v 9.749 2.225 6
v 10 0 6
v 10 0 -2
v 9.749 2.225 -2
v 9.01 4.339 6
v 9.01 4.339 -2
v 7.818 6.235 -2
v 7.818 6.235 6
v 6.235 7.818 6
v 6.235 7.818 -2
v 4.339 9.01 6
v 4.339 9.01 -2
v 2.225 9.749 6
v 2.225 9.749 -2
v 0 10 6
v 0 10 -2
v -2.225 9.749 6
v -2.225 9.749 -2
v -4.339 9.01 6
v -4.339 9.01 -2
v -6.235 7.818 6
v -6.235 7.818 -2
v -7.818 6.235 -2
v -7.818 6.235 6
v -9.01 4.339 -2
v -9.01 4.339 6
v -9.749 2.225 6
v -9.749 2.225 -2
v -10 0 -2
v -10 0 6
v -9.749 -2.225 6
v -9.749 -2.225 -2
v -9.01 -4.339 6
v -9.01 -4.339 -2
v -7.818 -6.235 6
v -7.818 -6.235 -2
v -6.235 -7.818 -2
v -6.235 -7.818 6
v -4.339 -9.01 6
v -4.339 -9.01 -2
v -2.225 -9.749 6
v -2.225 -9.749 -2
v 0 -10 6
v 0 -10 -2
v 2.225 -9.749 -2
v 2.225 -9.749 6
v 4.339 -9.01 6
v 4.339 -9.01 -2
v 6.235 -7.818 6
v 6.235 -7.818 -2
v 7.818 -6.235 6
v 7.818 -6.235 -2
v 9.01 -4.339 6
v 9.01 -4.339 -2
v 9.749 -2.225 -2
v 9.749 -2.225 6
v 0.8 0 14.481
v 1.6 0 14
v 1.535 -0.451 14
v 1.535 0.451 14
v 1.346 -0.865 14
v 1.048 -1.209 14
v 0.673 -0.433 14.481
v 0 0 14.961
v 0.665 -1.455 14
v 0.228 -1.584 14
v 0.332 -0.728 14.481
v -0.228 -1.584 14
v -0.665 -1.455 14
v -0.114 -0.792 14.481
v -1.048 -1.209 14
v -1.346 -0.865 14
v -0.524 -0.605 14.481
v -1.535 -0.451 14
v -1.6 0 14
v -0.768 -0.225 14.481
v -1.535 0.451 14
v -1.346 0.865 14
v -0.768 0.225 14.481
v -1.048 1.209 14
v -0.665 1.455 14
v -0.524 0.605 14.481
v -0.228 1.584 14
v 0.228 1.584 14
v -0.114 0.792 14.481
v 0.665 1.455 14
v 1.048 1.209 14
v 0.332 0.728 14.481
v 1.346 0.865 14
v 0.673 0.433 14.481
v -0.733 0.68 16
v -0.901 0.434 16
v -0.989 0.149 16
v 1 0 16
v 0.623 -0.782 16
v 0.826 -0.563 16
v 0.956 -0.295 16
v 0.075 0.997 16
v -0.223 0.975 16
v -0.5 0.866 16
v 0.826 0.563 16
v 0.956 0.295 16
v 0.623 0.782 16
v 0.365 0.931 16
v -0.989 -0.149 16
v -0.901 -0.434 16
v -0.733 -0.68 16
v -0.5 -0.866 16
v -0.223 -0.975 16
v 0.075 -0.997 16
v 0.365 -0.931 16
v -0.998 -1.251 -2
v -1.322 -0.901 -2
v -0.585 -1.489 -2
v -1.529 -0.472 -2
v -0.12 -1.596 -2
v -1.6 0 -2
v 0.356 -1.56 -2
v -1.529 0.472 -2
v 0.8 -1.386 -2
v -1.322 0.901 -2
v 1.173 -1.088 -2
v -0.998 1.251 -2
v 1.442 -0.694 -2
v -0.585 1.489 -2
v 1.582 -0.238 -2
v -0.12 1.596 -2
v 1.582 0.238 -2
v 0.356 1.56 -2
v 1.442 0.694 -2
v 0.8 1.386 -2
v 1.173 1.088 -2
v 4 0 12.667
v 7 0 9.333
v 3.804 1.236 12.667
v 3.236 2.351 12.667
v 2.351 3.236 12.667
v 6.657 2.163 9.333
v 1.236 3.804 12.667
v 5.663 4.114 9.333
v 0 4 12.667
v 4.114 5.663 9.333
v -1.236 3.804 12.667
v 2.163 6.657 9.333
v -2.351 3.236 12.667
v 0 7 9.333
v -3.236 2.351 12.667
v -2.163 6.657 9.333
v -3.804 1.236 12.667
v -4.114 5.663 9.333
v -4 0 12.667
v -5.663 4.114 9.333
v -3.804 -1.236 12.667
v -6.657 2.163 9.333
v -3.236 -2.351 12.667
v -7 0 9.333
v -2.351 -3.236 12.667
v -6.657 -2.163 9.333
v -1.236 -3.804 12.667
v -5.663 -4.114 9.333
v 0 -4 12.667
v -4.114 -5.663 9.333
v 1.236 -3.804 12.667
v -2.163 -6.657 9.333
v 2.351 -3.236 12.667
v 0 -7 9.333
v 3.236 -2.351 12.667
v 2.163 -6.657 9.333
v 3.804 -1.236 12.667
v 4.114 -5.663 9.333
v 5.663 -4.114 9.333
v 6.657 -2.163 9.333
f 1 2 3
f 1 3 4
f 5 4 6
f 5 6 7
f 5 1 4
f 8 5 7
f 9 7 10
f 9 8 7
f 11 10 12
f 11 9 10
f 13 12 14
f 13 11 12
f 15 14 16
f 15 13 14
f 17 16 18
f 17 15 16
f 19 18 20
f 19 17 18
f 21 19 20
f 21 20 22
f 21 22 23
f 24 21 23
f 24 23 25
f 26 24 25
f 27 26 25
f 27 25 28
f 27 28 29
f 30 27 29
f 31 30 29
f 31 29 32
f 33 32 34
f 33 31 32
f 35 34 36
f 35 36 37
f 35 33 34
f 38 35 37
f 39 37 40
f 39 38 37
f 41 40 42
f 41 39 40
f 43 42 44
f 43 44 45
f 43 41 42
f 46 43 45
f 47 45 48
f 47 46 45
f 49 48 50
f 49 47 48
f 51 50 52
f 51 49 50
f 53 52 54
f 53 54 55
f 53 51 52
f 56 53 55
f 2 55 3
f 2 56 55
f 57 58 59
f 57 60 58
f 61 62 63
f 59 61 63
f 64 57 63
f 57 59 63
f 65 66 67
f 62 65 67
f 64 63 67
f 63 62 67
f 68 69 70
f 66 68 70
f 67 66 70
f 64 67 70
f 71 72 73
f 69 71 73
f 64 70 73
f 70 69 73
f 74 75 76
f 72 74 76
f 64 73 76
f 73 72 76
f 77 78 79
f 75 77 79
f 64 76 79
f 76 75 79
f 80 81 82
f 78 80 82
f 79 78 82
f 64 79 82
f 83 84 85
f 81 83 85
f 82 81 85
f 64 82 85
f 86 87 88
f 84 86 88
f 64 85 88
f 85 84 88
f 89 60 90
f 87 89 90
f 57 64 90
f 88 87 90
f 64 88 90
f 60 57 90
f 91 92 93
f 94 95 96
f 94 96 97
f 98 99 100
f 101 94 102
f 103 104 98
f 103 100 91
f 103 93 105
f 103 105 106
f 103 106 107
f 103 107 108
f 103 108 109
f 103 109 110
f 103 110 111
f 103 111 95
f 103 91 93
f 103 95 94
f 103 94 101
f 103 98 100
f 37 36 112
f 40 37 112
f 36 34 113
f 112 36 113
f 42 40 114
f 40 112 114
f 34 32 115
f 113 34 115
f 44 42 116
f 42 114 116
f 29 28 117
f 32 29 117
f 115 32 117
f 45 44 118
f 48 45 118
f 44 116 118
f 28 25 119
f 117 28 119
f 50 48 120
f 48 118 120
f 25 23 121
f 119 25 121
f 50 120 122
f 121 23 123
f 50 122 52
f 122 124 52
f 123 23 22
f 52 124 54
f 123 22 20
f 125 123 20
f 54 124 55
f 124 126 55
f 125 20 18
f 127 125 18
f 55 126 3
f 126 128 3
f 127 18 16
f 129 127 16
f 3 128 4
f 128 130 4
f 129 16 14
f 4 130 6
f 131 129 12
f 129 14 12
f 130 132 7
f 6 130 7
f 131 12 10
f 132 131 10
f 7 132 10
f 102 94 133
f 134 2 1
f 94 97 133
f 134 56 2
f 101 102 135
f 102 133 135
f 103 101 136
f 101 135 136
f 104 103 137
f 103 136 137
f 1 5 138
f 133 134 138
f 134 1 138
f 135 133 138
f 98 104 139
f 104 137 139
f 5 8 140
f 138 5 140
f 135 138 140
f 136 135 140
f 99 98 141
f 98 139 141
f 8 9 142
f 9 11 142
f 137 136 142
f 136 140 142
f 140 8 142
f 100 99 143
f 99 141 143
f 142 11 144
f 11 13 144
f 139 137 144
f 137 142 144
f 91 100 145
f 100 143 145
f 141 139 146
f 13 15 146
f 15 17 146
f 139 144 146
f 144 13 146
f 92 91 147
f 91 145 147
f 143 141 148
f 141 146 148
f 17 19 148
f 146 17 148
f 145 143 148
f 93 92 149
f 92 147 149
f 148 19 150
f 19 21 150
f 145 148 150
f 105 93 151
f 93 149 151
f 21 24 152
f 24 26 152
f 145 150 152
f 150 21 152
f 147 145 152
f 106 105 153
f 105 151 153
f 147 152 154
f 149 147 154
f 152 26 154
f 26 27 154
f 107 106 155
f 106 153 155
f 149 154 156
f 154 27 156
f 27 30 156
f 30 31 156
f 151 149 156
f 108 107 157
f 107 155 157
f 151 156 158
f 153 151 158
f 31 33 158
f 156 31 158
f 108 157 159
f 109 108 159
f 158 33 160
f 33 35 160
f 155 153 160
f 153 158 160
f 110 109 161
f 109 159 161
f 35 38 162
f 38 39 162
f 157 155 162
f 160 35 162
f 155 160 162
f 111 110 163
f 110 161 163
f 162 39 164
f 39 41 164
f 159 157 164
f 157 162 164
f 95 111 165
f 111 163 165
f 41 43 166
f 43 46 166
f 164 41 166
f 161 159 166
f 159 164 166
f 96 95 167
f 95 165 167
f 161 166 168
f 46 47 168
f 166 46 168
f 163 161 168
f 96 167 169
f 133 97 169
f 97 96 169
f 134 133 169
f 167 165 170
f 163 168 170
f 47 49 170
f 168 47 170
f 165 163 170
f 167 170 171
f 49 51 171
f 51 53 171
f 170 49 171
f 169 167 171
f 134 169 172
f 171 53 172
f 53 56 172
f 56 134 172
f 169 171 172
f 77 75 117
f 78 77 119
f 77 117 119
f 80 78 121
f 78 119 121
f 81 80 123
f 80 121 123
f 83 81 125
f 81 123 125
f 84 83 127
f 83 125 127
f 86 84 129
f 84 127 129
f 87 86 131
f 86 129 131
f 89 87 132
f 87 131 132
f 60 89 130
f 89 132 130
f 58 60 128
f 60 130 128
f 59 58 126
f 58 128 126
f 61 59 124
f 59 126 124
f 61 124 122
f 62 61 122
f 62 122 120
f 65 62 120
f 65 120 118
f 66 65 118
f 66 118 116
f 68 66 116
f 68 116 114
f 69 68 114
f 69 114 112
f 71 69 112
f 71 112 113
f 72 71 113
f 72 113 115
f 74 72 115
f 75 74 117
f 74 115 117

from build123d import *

# Parameters (mm, degrees)
F0_R           = 10
F0_R_2         = 6.1
F1_DEPTH       = 6
F2_DEPTH       = 10
F4_R           = 1
F1_FACE_R      = 10
F7_D           = 4.2
F7_CBORE_D     = 7
F7_CBORE_DEPTH = 4
F8_D           = 3.2
F8_DEPTH       = 8
F8_START       = 6
F8_TIP         = 0.9613769904
F6_R           = 10
F10_DEPTH      = 8
F12_DEPTH      = 10


with BuildPart() as f1:
    # F0 (on Top) → F1 (new body)
    with BuildSketch(Plane.XY):
        Circle(F0_R)
        Circle(F0_R_2, mode=Mode.SUBTRACT)
        Circle(F0_R_2)
    extrude(amount=F1_DEPTH)

    # F0 (on Top) → F2 (join)
    with BuildSketch(Plane.XY):
        Circle(F0_R)
        Circle(F0_R_2, mode=Mode.SUBTRACT)
    extrude(amount=-F2_DEPTH)

    # F7 (through all)
    with Locations(Plane(origin=(0, 0, 0), x_dir=(1, 0, 0), z_dir=(0, 0, -1))):
        with Locations((0, 0)):
            CounterBoreHole(F7_D / 2, F7_CBORE_D / 2, F7_CBORE_DEPTH)


with BuildPart() as f5:
    # F4 (on offset) → F5 section 0
    with BuildSketch(Plane.XY.offset(16)):
        Circle(F4_R)
    # F1_face (on face) → F5 section 1
    with BuildSketch(Plane.XY.offset(6)):
        Circle(F1_FACE_R)
    loft()

    # F8
    # its depths count from where the whole tool has entered the part; down to there all is cleared
    with Locations(Plane(origin=(0, 0, 0), x_dir=(1, 0, 0), z_dir=(0, 0, -1)).offset(-F8_START)):
        with Locations((0, 0)):
            Hole(F8_D / 2, depth=F8_DEPTH)
            with Locations((0, 0, -(F8_DEPTH + F8_TIP / 2))):  # 118° drill point
                Cone(0, F8_D / 2, F8_TIP, mode=Mode.SUBTRACT)

    # F6 (on face) → F10 (join)
    with BuildSketch(Plane.XY.offset(6)):
        Circle(F6_R)
    extrude(amount=-F10_DEPTH)

    # F11 (on face) → F12 (cut)
    with BuildSketch(Plane(origin=(0, 0, -2), x_dir=(1, 0, 0), z_dir=(0, 0, -1))):
        with BuildLine():
            ThreePointArc((1.6, 0), (0, 1.6), (-1.6, 0))
            ThreePointArc((-1.6, 0), (0, -1.6), (1.6, 0))
        make_face()
    extrude(amount=-F12_DEPTH, mode=Mode.SUBTRACT)


solid = f5.part
